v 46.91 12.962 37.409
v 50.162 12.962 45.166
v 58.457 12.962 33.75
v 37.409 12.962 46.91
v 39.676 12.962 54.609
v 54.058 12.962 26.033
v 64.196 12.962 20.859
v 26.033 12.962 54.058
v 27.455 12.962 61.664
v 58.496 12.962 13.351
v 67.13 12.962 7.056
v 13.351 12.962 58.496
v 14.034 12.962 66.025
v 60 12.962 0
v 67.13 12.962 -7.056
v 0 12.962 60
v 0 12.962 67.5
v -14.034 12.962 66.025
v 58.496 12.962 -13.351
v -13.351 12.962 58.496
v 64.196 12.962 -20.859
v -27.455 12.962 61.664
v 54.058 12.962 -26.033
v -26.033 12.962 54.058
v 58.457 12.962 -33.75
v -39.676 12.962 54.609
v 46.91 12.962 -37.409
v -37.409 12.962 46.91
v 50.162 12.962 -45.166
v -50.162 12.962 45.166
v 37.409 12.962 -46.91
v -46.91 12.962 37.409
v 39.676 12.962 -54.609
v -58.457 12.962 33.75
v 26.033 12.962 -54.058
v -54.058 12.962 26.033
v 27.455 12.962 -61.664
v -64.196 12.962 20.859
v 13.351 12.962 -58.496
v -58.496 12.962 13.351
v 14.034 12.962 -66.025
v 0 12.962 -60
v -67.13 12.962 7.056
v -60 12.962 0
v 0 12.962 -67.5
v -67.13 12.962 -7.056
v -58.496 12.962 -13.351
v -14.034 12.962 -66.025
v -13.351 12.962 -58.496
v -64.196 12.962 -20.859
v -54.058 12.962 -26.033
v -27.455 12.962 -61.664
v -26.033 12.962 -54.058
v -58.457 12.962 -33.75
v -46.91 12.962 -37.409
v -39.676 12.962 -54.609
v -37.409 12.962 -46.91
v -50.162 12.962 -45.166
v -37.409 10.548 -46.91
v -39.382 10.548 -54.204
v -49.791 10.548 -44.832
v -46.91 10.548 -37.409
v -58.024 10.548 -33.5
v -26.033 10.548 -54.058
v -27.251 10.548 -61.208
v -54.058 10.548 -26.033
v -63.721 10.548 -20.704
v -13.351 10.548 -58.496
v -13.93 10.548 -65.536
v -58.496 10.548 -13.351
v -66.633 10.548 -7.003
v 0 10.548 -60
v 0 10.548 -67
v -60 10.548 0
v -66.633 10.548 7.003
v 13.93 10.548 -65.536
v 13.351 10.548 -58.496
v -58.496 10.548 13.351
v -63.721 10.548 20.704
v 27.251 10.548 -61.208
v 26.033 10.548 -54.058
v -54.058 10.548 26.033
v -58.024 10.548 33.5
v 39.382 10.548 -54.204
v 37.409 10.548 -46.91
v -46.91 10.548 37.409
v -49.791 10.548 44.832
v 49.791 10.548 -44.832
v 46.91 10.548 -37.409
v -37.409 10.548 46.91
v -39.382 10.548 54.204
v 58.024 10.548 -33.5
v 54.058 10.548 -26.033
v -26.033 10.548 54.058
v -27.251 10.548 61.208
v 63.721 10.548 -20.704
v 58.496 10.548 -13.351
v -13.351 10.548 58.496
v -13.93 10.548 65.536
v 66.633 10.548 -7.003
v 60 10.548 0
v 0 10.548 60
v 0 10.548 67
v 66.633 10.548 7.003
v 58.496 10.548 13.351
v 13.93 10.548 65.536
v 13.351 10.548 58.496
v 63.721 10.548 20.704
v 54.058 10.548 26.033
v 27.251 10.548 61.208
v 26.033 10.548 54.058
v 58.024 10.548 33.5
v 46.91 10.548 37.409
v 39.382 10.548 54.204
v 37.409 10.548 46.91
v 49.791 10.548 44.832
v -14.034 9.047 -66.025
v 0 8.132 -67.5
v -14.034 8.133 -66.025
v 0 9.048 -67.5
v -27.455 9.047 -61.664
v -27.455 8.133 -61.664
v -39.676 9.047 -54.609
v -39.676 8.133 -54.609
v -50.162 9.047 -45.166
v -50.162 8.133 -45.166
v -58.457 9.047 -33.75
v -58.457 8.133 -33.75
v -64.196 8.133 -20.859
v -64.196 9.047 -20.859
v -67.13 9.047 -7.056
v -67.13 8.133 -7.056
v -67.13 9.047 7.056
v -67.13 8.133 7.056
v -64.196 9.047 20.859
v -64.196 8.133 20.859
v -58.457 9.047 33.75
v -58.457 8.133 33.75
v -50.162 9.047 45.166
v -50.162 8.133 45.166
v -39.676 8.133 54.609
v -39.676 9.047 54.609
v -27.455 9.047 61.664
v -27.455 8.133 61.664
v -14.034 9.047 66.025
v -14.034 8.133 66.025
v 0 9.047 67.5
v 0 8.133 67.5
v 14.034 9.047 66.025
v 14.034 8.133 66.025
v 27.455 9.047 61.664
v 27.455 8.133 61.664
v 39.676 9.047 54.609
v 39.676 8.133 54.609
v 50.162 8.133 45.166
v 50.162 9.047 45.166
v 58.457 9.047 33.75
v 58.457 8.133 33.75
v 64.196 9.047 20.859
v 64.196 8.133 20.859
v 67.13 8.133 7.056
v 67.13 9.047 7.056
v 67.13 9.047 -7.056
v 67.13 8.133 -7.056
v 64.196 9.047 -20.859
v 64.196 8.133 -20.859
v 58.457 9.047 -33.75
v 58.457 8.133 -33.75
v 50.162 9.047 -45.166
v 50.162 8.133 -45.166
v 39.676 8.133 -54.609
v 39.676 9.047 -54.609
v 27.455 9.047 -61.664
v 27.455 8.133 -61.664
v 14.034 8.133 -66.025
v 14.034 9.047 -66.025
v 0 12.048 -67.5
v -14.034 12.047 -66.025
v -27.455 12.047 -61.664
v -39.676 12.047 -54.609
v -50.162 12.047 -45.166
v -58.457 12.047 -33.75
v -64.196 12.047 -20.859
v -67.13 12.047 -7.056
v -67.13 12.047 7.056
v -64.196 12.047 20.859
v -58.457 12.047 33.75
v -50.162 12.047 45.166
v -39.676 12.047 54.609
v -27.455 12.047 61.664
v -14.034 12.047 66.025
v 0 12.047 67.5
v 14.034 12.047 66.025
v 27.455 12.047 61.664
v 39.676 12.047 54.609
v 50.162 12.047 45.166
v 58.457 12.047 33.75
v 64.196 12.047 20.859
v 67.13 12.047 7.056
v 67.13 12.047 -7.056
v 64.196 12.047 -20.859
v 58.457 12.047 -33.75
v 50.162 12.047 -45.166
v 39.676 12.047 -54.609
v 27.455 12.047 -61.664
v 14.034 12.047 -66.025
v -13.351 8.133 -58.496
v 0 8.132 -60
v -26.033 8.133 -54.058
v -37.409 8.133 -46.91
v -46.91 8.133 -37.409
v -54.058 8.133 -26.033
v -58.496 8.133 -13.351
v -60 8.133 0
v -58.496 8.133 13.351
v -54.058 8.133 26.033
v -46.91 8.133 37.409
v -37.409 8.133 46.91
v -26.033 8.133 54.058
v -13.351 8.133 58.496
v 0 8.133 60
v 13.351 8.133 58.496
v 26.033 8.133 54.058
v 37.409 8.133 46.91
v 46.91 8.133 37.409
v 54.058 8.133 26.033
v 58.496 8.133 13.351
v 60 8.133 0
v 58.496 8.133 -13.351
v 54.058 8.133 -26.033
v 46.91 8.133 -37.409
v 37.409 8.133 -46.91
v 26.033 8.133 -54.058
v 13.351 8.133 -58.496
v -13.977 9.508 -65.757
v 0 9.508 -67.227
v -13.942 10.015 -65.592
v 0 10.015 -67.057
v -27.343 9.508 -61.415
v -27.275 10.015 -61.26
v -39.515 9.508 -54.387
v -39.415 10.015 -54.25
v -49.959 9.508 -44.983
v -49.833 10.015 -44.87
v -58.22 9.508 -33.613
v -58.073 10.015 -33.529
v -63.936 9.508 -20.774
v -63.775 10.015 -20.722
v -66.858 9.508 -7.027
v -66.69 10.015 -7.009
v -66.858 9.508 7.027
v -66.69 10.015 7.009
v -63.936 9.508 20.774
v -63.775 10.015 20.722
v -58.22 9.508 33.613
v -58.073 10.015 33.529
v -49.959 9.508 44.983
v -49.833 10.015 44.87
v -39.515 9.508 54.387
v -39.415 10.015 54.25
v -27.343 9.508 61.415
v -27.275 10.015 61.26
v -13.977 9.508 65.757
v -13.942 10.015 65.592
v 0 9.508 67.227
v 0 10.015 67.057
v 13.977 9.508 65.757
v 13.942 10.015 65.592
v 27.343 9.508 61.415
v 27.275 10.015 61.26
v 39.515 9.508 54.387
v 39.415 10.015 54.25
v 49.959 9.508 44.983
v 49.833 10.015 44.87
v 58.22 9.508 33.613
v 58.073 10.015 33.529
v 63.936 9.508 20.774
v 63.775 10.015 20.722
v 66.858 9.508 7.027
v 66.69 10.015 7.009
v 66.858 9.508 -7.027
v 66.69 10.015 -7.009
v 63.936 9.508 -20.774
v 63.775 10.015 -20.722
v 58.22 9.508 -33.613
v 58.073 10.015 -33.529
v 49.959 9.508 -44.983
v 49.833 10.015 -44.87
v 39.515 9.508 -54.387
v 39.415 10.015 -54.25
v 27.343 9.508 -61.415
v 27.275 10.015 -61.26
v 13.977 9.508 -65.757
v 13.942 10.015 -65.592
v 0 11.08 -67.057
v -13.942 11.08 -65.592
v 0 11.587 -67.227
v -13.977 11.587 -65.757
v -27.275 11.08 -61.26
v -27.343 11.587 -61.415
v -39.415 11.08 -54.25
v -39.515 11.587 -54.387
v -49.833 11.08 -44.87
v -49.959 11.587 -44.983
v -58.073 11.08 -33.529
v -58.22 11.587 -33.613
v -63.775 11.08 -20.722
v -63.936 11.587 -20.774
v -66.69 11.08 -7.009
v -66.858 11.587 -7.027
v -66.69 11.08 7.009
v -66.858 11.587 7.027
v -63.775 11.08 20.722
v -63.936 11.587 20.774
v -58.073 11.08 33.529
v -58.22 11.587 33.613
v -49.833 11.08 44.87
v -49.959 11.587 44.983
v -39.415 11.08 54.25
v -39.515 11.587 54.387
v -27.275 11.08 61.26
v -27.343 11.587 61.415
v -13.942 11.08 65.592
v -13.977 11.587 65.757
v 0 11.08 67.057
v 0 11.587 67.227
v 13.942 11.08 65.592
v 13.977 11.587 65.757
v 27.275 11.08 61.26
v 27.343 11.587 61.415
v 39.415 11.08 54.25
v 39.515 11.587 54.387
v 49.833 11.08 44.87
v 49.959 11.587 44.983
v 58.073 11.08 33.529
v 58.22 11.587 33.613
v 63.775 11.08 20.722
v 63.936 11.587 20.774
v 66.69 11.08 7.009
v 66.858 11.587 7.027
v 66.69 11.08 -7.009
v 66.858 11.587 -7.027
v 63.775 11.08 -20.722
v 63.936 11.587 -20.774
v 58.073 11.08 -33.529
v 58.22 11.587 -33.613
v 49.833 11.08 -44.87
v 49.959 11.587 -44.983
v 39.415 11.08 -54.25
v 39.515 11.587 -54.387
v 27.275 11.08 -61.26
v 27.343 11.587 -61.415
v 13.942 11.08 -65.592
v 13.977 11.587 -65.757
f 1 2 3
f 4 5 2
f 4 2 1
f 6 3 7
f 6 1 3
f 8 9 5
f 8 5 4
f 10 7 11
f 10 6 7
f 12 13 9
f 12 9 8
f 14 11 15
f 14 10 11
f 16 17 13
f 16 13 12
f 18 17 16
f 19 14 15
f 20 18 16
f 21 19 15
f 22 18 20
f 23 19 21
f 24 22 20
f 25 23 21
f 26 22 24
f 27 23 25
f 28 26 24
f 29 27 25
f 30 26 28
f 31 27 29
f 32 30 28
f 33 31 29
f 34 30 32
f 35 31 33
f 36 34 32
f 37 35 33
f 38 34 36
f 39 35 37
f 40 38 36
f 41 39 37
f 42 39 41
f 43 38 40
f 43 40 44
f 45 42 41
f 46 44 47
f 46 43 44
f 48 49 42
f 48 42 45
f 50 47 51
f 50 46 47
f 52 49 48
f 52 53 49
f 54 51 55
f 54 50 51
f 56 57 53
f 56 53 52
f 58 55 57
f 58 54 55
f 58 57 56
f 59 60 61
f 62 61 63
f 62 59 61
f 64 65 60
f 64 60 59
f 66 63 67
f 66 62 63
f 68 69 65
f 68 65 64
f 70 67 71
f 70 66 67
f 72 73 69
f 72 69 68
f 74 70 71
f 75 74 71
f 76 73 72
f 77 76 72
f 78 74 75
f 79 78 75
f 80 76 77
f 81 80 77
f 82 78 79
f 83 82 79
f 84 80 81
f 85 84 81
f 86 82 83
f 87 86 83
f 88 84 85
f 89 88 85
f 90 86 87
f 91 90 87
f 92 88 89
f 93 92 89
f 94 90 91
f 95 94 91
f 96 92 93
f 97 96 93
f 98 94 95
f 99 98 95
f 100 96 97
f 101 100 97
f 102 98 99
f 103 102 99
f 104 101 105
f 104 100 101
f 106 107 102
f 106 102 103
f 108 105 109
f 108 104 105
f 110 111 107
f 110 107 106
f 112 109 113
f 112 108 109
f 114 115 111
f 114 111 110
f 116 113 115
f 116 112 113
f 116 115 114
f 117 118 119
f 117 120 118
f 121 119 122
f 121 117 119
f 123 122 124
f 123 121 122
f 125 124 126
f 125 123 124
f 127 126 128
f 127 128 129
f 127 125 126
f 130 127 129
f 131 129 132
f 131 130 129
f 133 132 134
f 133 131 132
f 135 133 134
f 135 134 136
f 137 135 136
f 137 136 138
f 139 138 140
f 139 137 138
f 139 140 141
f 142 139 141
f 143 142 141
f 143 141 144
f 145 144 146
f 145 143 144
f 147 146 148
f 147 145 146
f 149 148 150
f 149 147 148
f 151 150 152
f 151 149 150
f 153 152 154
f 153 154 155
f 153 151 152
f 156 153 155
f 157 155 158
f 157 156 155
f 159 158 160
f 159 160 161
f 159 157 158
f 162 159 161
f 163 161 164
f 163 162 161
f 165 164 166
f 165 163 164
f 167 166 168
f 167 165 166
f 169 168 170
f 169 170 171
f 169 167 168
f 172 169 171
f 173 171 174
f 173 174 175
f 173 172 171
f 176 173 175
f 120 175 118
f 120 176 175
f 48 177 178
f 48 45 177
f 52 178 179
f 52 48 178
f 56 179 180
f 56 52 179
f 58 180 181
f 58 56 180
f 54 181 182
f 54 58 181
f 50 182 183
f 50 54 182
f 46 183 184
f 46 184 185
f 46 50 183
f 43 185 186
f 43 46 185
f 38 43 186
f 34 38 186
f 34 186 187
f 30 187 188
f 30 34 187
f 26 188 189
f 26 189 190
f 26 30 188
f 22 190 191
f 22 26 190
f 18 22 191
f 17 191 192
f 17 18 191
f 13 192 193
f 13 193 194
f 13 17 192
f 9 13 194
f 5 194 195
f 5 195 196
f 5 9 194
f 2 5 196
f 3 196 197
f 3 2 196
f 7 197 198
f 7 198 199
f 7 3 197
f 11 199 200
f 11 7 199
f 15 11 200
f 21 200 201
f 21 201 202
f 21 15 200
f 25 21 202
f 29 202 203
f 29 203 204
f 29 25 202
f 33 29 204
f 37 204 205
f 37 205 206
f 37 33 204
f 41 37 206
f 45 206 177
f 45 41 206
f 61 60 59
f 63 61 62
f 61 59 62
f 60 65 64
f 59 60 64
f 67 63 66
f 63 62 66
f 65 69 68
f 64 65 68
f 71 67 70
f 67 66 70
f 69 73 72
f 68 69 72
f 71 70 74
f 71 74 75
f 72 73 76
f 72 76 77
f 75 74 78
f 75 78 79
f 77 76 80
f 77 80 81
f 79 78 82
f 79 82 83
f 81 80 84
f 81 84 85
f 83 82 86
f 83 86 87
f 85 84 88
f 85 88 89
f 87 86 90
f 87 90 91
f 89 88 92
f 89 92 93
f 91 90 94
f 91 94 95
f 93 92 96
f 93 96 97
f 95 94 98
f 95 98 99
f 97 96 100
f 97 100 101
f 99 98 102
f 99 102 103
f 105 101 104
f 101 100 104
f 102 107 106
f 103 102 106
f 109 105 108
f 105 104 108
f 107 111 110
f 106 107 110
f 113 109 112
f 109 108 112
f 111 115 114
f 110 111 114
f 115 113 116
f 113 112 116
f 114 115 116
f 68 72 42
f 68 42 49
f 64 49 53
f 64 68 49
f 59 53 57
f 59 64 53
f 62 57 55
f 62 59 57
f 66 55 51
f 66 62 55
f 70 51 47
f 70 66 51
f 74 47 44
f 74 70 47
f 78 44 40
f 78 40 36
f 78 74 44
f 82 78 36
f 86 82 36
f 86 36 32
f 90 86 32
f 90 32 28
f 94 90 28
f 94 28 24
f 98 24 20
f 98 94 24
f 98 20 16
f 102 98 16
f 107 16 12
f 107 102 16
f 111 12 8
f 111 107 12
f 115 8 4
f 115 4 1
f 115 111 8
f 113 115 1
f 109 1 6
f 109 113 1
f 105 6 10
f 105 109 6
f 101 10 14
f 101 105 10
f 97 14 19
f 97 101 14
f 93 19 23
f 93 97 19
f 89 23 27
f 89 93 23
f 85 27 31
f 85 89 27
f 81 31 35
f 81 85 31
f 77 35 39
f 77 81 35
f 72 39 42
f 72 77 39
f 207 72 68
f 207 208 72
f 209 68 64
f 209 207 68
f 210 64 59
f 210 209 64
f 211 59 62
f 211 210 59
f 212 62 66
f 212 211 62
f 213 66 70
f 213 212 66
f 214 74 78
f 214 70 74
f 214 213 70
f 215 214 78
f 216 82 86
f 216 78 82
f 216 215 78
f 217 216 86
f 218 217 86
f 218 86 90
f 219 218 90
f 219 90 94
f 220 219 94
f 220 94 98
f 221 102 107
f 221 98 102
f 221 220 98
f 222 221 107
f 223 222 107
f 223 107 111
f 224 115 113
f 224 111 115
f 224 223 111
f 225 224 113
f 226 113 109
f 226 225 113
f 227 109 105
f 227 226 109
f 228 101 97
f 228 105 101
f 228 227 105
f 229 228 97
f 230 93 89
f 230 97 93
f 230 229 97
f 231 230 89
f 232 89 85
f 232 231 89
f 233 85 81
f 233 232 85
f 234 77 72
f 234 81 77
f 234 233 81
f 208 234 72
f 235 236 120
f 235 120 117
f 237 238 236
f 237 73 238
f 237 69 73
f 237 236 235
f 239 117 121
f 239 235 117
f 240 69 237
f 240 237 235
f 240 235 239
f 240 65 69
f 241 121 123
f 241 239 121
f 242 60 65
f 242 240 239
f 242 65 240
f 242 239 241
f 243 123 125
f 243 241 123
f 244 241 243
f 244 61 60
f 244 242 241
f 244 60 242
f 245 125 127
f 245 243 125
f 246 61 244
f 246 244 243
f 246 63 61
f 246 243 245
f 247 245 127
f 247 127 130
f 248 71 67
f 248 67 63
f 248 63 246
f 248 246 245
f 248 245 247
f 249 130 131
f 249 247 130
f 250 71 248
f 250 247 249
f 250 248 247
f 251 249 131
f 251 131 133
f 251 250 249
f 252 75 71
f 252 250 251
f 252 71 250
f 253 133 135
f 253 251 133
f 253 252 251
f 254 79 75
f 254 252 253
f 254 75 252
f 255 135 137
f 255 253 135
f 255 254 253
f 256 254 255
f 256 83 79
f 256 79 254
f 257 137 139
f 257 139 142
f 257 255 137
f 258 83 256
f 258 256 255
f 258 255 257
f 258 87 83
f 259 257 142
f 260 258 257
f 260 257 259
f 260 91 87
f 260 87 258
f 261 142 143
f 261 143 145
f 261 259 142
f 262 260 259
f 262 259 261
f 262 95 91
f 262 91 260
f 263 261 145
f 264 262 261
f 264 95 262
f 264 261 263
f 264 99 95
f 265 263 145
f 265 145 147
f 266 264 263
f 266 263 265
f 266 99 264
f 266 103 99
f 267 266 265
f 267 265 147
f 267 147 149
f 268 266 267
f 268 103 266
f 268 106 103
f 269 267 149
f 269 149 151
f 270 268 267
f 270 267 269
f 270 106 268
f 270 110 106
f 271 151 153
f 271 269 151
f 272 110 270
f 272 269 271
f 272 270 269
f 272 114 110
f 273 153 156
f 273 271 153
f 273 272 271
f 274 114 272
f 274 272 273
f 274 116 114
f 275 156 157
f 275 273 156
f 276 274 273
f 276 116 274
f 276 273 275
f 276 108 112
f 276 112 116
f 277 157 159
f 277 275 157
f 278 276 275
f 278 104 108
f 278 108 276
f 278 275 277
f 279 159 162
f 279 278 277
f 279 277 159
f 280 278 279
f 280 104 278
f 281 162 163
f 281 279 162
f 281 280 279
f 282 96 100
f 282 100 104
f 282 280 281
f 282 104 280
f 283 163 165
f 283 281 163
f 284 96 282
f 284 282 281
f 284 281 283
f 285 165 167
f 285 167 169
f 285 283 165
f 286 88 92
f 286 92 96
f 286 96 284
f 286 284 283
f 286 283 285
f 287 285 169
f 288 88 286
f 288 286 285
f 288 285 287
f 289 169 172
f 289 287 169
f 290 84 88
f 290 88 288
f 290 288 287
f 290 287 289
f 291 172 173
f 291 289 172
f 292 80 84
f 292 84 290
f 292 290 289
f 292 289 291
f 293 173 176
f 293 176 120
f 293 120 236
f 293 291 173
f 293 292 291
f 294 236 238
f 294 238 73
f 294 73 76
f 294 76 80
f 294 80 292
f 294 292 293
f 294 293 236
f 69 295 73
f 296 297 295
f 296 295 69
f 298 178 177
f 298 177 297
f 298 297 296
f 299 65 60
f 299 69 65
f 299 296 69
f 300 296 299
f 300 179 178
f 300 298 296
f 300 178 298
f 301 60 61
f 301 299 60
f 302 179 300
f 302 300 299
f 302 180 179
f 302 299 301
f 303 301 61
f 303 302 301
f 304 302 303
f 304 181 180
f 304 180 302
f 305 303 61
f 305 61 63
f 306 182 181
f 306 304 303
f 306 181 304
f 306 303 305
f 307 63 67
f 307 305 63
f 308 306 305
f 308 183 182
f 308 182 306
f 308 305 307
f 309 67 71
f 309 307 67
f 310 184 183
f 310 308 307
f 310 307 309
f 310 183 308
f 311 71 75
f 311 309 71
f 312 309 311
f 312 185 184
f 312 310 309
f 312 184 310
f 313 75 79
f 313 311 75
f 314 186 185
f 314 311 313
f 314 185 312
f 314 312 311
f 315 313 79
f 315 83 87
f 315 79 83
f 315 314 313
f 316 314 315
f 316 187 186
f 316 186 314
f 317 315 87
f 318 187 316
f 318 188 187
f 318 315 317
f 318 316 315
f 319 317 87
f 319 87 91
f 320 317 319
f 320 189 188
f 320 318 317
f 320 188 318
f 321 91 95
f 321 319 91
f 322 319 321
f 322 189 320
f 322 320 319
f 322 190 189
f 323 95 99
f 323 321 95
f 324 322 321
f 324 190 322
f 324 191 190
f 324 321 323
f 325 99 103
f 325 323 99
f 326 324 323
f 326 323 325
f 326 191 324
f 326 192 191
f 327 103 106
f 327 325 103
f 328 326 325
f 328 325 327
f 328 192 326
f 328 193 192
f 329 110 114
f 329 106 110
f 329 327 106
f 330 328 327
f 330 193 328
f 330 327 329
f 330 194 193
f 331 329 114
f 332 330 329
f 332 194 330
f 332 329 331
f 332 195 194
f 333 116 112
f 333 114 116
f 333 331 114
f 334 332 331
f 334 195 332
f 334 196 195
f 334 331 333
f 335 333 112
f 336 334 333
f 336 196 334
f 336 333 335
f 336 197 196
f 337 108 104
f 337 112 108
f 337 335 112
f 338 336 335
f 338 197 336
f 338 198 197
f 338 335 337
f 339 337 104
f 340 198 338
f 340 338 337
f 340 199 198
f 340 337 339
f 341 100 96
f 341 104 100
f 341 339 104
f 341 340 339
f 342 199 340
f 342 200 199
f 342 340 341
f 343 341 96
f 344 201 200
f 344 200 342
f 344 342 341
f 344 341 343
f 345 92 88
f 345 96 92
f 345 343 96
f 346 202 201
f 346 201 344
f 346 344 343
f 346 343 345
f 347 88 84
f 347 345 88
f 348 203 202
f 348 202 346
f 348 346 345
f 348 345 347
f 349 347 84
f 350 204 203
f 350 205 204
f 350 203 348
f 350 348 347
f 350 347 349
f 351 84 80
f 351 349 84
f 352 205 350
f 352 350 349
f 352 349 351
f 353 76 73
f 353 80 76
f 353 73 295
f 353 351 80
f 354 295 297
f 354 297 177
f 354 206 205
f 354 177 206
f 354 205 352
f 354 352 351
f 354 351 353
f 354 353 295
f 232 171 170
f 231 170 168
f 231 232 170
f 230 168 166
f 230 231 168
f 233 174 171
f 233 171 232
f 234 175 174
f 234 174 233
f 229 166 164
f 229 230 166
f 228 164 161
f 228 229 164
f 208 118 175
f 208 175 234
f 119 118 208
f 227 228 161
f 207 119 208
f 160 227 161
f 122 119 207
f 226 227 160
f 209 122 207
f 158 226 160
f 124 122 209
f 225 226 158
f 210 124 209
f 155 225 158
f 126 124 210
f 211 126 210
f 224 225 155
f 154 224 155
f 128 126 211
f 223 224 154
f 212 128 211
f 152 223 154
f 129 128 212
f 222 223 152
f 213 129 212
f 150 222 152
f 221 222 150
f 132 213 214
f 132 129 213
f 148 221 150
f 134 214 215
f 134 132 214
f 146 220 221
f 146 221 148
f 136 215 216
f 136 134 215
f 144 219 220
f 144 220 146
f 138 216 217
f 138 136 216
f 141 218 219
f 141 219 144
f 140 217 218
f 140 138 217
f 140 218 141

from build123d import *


with BuildPart() as part:
    # Sketch1 → Revolve1 (revolve)
    with BuildSketch(Plane.XY, mode=Mode.PRIVATE) as revolve1_sk:
        with BuildLine():
            Line((-67.5, 12.0475), (-67.5, 12.9625))
            Line((-67.5, 12.9625), (-60, 12.9625))
            Line((-60, 12.9625), (-60, 8.1325))
            Line((-60, 8.1325), (-67.5, 8.1325))
            Line((-67.5, 8.1325), (-67.5, 9.0475))
            ThreePointArc((-67.5, 9.0475), (-67, 10.5475), (-67.5, 12.0475))
        make_face()
    revolve(revolve1_sk.sketch.rotate(Axis((0, -200069.047495165, 0), (0, 1, 0)), 270), axis=Axis((0, -200069.047495165, 0), (0, 1, 0)))


with BuildPart() as body_2:
    # Split1: the piece on the far side of the plane
    add(part.part)
    split(bisect_by=Plane.ZX.offset(10.5475), keep=Keep.BOTTOM)


with BuildPart() as part_1:
    add(part.part)

    # Split1
    split(bisect_by=Plane.ZX.offset(10.5475), keep=Keep.TOP)


solid = Compound([body_2.part, part_1.part])
